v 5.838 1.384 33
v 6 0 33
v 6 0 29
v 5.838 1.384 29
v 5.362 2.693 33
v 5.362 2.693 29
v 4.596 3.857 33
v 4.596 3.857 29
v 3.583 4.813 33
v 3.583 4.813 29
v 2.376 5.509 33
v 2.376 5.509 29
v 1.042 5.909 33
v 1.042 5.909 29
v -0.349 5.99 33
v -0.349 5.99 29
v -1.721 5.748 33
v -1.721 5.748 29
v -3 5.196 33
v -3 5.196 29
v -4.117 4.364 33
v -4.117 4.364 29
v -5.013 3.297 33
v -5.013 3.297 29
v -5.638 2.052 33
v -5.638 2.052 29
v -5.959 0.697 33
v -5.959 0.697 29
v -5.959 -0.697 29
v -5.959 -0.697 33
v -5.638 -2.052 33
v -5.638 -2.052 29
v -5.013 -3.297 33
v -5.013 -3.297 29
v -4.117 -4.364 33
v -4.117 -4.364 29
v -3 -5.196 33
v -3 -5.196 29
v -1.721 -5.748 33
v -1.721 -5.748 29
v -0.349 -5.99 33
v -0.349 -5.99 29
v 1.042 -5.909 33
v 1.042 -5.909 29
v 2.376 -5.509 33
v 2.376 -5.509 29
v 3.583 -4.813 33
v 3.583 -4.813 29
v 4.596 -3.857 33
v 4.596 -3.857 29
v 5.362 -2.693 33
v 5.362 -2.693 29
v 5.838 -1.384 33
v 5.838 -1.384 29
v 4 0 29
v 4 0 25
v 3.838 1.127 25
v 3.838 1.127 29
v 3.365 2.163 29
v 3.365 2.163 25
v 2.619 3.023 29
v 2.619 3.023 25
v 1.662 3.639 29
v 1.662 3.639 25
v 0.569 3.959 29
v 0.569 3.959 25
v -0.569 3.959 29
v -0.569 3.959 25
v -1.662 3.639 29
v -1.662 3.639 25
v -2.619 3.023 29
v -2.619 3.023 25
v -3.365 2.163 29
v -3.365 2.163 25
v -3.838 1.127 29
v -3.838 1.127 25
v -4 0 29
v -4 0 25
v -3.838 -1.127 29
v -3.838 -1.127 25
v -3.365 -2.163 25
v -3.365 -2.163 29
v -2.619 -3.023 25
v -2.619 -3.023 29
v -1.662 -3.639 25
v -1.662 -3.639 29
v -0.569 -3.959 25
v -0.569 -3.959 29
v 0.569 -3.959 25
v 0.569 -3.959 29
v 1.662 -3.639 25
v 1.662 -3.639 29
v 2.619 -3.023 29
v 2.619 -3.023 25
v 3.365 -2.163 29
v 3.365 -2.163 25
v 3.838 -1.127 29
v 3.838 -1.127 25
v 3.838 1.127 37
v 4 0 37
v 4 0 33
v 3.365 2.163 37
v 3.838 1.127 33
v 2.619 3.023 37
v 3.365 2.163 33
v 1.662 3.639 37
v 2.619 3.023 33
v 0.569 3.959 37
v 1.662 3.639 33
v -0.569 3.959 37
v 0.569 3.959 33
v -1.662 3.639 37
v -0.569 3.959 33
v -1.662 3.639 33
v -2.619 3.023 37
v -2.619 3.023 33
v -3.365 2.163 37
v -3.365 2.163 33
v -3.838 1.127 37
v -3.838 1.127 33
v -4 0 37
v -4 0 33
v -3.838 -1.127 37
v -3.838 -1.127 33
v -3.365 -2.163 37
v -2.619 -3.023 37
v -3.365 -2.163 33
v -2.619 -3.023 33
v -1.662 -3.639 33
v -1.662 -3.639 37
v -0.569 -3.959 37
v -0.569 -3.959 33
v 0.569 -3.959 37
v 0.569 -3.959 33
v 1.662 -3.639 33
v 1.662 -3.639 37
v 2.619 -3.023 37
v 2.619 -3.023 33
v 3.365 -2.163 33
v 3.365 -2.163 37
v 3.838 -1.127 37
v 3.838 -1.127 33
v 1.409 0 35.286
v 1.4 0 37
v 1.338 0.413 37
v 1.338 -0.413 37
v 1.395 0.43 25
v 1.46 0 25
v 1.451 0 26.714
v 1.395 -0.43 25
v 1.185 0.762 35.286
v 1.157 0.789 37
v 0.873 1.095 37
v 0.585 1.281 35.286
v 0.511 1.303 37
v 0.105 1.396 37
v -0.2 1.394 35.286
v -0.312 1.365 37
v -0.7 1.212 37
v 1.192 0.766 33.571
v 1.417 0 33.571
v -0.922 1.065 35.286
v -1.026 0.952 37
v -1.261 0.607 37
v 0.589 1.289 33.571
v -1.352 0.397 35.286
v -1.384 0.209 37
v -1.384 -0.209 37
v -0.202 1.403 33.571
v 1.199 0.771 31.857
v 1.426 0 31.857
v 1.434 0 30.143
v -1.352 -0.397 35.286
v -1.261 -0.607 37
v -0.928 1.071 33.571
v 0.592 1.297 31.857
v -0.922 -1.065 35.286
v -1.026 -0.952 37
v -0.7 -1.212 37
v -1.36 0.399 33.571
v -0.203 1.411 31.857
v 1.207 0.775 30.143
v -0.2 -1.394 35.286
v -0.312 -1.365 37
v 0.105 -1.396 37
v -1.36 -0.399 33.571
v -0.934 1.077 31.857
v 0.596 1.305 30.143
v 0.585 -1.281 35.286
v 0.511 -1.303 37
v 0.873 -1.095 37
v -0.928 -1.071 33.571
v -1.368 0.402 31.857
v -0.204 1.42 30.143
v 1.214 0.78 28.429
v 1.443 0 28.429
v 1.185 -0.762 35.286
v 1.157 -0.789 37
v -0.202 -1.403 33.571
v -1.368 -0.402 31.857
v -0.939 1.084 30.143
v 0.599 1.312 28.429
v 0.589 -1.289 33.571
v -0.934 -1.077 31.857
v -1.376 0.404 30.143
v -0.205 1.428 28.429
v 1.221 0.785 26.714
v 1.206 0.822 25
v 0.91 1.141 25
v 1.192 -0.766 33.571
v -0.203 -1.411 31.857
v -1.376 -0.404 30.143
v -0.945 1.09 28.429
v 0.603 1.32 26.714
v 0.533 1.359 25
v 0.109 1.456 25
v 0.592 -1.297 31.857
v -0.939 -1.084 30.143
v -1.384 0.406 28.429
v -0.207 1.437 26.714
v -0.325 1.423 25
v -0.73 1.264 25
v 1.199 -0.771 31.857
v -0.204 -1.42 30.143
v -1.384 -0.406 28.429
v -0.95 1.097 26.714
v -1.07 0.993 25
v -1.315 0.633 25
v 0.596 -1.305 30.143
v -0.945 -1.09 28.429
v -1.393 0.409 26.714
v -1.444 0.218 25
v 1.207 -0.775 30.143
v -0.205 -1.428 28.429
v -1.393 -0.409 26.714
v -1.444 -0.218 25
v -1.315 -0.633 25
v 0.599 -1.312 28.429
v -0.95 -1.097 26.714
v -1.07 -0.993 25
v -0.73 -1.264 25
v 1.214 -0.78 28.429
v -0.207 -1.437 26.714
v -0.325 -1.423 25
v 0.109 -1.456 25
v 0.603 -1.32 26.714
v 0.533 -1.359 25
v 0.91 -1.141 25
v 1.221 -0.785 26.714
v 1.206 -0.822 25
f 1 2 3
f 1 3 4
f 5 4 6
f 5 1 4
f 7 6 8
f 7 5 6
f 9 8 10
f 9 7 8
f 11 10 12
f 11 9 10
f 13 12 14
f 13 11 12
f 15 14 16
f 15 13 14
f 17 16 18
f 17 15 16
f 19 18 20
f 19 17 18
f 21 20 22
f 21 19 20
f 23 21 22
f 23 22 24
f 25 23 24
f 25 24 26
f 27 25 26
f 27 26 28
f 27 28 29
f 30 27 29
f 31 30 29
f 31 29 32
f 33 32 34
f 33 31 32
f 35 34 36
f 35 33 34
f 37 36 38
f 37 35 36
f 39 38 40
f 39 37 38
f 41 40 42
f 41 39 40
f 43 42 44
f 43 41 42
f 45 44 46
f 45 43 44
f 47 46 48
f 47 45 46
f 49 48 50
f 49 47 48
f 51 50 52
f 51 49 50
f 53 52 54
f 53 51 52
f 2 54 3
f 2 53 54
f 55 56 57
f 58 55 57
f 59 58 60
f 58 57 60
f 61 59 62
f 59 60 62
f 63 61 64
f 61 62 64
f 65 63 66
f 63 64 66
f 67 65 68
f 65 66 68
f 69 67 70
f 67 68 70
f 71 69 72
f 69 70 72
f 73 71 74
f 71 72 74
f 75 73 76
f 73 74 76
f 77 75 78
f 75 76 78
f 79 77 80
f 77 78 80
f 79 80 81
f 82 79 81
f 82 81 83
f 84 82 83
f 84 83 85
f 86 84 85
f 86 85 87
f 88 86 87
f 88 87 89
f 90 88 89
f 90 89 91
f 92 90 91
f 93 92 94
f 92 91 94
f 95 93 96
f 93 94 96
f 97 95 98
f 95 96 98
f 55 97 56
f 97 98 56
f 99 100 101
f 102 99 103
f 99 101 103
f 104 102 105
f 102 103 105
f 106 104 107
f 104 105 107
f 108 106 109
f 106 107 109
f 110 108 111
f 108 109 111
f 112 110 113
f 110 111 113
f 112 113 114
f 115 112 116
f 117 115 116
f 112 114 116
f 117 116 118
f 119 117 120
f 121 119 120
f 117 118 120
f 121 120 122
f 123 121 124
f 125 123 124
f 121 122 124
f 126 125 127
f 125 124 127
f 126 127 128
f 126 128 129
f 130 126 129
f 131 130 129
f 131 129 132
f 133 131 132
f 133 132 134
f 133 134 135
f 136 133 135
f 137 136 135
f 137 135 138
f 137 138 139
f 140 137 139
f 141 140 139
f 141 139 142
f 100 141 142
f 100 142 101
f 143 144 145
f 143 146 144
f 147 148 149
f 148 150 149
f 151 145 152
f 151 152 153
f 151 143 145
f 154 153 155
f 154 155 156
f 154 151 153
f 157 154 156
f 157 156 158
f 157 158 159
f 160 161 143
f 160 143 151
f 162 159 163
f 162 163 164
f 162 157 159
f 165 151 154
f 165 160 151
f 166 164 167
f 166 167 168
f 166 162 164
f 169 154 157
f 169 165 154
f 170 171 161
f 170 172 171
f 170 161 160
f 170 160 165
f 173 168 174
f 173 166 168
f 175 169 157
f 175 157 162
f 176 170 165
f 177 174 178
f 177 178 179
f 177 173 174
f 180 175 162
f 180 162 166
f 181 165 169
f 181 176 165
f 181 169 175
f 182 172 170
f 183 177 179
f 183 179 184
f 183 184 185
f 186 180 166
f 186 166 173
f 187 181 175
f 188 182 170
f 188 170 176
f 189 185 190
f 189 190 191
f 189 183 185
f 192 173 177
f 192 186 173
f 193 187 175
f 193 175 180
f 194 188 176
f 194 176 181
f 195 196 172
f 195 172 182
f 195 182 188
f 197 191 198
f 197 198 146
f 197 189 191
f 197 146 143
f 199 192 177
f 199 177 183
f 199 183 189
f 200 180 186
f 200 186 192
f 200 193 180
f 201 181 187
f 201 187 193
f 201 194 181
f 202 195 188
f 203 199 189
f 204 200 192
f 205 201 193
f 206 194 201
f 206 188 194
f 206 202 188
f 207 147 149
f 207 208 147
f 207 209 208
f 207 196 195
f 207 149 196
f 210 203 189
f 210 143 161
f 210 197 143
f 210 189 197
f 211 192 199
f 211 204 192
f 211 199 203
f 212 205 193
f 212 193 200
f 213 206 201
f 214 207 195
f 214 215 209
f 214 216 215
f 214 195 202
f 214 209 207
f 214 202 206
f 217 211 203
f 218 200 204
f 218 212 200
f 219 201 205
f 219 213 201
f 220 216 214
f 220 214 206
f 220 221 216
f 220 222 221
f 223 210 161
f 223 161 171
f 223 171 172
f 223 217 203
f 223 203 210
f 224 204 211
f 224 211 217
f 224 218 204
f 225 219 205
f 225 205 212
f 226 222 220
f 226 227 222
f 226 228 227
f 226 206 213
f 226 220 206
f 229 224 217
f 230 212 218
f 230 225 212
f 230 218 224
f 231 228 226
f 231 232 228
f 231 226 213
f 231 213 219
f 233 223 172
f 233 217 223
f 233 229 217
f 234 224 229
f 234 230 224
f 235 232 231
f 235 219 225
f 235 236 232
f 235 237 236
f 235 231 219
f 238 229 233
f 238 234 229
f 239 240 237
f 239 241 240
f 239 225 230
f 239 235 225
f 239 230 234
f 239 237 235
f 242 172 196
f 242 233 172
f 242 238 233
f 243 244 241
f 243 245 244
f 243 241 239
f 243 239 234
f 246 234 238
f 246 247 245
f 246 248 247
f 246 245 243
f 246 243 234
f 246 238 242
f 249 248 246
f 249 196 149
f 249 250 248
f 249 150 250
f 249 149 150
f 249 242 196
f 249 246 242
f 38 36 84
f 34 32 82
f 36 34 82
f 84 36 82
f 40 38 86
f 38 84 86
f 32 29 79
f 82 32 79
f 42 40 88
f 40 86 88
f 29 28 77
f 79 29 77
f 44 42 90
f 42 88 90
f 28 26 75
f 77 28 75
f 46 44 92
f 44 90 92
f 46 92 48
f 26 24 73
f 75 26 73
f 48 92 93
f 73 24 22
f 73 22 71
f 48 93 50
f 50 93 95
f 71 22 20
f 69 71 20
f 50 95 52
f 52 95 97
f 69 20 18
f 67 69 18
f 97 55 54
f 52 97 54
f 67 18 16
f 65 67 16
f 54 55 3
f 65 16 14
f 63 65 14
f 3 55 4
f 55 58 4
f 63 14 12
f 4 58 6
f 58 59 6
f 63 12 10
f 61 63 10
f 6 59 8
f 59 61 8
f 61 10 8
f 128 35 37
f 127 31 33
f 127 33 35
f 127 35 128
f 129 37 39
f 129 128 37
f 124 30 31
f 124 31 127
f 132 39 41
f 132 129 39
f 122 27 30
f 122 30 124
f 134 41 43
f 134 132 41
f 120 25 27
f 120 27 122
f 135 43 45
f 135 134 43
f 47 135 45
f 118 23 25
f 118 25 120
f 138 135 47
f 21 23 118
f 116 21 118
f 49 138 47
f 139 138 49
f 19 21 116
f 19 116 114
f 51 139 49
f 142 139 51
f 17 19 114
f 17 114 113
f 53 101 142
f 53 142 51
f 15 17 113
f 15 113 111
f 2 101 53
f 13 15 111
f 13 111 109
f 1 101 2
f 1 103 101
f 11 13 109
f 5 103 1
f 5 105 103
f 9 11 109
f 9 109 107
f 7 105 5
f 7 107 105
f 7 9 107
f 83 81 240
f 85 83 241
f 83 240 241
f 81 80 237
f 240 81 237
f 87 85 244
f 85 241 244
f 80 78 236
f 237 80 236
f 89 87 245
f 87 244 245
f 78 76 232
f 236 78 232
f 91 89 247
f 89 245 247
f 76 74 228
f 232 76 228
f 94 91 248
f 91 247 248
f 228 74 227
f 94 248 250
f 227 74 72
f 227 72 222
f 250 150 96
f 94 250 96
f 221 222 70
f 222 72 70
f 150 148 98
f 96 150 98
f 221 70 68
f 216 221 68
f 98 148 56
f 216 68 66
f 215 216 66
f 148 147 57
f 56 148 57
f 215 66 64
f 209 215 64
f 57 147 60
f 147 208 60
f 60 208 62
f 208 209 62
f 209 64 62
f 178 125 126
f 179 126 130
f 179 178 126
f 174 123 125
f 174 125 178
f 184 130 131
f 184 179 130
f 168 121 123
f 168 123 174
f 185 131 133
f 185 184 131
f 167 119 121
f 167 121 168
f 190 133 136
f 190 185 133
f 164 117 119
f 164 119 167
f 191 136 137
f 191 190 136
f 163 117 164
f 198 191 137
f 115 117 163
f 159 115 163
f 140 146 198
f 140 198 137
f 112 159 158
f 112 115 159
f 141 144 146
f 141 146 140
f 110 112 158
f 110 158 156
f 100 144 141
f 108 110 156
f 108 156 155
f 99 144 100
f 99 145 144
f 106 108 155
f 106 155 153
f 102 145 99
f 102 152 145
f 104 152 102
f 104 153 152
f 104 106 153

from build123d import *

# Parameters (mm, degrees)
SKETCH1_R                = 6
BOSS_EXTRUDE1_DEPTH      = 4
BOSS_EXTRUDE2_DEPTH      = 4
BOSS_EXTRUDE2_DEPTH_BACK = 8
SKETCH2_R                = 4
SKETCH8_R                = 1.4
SKETCH6_R                = 1.46


with BuildPart() as part:
    # Sketch1 → Boss-Extrude1 (new body)
    with BuildSketch(Plane.XY.offset(33)):
        Circle(SKETCH1_R)
    extrude(amount=-BOSS_EXTRUDE1_DEPTH)

    # Sketch2 → Boss-Extrude2 (add, two sides: drawn at the far end of the back side and taken through both)
    with BuildSketch(Plane.XY.offset(33).offset(-BOSS_EXTRUDE2_DEPTH_BACK)):
        Circle(SKETCH2_R)
    extrude(amount=BOSS_EXTRUDE2_DEPTH + BOSS_EXTRUDE2_DEPTH_BACK)

    # Sketch8 → Cut-Loft2 section 0
    with BuildSketch(Plane.XY.offset(37)):
        Circle(SKETCH8_R)
    # Sketch6 → Cut-Loft2 section 1
    with BuildSketch(Plane.XY.offset(25)):
        Circle(SKETCH6_R)
    loft(mode=Mode.SUBTRACT)


solid = part.part
